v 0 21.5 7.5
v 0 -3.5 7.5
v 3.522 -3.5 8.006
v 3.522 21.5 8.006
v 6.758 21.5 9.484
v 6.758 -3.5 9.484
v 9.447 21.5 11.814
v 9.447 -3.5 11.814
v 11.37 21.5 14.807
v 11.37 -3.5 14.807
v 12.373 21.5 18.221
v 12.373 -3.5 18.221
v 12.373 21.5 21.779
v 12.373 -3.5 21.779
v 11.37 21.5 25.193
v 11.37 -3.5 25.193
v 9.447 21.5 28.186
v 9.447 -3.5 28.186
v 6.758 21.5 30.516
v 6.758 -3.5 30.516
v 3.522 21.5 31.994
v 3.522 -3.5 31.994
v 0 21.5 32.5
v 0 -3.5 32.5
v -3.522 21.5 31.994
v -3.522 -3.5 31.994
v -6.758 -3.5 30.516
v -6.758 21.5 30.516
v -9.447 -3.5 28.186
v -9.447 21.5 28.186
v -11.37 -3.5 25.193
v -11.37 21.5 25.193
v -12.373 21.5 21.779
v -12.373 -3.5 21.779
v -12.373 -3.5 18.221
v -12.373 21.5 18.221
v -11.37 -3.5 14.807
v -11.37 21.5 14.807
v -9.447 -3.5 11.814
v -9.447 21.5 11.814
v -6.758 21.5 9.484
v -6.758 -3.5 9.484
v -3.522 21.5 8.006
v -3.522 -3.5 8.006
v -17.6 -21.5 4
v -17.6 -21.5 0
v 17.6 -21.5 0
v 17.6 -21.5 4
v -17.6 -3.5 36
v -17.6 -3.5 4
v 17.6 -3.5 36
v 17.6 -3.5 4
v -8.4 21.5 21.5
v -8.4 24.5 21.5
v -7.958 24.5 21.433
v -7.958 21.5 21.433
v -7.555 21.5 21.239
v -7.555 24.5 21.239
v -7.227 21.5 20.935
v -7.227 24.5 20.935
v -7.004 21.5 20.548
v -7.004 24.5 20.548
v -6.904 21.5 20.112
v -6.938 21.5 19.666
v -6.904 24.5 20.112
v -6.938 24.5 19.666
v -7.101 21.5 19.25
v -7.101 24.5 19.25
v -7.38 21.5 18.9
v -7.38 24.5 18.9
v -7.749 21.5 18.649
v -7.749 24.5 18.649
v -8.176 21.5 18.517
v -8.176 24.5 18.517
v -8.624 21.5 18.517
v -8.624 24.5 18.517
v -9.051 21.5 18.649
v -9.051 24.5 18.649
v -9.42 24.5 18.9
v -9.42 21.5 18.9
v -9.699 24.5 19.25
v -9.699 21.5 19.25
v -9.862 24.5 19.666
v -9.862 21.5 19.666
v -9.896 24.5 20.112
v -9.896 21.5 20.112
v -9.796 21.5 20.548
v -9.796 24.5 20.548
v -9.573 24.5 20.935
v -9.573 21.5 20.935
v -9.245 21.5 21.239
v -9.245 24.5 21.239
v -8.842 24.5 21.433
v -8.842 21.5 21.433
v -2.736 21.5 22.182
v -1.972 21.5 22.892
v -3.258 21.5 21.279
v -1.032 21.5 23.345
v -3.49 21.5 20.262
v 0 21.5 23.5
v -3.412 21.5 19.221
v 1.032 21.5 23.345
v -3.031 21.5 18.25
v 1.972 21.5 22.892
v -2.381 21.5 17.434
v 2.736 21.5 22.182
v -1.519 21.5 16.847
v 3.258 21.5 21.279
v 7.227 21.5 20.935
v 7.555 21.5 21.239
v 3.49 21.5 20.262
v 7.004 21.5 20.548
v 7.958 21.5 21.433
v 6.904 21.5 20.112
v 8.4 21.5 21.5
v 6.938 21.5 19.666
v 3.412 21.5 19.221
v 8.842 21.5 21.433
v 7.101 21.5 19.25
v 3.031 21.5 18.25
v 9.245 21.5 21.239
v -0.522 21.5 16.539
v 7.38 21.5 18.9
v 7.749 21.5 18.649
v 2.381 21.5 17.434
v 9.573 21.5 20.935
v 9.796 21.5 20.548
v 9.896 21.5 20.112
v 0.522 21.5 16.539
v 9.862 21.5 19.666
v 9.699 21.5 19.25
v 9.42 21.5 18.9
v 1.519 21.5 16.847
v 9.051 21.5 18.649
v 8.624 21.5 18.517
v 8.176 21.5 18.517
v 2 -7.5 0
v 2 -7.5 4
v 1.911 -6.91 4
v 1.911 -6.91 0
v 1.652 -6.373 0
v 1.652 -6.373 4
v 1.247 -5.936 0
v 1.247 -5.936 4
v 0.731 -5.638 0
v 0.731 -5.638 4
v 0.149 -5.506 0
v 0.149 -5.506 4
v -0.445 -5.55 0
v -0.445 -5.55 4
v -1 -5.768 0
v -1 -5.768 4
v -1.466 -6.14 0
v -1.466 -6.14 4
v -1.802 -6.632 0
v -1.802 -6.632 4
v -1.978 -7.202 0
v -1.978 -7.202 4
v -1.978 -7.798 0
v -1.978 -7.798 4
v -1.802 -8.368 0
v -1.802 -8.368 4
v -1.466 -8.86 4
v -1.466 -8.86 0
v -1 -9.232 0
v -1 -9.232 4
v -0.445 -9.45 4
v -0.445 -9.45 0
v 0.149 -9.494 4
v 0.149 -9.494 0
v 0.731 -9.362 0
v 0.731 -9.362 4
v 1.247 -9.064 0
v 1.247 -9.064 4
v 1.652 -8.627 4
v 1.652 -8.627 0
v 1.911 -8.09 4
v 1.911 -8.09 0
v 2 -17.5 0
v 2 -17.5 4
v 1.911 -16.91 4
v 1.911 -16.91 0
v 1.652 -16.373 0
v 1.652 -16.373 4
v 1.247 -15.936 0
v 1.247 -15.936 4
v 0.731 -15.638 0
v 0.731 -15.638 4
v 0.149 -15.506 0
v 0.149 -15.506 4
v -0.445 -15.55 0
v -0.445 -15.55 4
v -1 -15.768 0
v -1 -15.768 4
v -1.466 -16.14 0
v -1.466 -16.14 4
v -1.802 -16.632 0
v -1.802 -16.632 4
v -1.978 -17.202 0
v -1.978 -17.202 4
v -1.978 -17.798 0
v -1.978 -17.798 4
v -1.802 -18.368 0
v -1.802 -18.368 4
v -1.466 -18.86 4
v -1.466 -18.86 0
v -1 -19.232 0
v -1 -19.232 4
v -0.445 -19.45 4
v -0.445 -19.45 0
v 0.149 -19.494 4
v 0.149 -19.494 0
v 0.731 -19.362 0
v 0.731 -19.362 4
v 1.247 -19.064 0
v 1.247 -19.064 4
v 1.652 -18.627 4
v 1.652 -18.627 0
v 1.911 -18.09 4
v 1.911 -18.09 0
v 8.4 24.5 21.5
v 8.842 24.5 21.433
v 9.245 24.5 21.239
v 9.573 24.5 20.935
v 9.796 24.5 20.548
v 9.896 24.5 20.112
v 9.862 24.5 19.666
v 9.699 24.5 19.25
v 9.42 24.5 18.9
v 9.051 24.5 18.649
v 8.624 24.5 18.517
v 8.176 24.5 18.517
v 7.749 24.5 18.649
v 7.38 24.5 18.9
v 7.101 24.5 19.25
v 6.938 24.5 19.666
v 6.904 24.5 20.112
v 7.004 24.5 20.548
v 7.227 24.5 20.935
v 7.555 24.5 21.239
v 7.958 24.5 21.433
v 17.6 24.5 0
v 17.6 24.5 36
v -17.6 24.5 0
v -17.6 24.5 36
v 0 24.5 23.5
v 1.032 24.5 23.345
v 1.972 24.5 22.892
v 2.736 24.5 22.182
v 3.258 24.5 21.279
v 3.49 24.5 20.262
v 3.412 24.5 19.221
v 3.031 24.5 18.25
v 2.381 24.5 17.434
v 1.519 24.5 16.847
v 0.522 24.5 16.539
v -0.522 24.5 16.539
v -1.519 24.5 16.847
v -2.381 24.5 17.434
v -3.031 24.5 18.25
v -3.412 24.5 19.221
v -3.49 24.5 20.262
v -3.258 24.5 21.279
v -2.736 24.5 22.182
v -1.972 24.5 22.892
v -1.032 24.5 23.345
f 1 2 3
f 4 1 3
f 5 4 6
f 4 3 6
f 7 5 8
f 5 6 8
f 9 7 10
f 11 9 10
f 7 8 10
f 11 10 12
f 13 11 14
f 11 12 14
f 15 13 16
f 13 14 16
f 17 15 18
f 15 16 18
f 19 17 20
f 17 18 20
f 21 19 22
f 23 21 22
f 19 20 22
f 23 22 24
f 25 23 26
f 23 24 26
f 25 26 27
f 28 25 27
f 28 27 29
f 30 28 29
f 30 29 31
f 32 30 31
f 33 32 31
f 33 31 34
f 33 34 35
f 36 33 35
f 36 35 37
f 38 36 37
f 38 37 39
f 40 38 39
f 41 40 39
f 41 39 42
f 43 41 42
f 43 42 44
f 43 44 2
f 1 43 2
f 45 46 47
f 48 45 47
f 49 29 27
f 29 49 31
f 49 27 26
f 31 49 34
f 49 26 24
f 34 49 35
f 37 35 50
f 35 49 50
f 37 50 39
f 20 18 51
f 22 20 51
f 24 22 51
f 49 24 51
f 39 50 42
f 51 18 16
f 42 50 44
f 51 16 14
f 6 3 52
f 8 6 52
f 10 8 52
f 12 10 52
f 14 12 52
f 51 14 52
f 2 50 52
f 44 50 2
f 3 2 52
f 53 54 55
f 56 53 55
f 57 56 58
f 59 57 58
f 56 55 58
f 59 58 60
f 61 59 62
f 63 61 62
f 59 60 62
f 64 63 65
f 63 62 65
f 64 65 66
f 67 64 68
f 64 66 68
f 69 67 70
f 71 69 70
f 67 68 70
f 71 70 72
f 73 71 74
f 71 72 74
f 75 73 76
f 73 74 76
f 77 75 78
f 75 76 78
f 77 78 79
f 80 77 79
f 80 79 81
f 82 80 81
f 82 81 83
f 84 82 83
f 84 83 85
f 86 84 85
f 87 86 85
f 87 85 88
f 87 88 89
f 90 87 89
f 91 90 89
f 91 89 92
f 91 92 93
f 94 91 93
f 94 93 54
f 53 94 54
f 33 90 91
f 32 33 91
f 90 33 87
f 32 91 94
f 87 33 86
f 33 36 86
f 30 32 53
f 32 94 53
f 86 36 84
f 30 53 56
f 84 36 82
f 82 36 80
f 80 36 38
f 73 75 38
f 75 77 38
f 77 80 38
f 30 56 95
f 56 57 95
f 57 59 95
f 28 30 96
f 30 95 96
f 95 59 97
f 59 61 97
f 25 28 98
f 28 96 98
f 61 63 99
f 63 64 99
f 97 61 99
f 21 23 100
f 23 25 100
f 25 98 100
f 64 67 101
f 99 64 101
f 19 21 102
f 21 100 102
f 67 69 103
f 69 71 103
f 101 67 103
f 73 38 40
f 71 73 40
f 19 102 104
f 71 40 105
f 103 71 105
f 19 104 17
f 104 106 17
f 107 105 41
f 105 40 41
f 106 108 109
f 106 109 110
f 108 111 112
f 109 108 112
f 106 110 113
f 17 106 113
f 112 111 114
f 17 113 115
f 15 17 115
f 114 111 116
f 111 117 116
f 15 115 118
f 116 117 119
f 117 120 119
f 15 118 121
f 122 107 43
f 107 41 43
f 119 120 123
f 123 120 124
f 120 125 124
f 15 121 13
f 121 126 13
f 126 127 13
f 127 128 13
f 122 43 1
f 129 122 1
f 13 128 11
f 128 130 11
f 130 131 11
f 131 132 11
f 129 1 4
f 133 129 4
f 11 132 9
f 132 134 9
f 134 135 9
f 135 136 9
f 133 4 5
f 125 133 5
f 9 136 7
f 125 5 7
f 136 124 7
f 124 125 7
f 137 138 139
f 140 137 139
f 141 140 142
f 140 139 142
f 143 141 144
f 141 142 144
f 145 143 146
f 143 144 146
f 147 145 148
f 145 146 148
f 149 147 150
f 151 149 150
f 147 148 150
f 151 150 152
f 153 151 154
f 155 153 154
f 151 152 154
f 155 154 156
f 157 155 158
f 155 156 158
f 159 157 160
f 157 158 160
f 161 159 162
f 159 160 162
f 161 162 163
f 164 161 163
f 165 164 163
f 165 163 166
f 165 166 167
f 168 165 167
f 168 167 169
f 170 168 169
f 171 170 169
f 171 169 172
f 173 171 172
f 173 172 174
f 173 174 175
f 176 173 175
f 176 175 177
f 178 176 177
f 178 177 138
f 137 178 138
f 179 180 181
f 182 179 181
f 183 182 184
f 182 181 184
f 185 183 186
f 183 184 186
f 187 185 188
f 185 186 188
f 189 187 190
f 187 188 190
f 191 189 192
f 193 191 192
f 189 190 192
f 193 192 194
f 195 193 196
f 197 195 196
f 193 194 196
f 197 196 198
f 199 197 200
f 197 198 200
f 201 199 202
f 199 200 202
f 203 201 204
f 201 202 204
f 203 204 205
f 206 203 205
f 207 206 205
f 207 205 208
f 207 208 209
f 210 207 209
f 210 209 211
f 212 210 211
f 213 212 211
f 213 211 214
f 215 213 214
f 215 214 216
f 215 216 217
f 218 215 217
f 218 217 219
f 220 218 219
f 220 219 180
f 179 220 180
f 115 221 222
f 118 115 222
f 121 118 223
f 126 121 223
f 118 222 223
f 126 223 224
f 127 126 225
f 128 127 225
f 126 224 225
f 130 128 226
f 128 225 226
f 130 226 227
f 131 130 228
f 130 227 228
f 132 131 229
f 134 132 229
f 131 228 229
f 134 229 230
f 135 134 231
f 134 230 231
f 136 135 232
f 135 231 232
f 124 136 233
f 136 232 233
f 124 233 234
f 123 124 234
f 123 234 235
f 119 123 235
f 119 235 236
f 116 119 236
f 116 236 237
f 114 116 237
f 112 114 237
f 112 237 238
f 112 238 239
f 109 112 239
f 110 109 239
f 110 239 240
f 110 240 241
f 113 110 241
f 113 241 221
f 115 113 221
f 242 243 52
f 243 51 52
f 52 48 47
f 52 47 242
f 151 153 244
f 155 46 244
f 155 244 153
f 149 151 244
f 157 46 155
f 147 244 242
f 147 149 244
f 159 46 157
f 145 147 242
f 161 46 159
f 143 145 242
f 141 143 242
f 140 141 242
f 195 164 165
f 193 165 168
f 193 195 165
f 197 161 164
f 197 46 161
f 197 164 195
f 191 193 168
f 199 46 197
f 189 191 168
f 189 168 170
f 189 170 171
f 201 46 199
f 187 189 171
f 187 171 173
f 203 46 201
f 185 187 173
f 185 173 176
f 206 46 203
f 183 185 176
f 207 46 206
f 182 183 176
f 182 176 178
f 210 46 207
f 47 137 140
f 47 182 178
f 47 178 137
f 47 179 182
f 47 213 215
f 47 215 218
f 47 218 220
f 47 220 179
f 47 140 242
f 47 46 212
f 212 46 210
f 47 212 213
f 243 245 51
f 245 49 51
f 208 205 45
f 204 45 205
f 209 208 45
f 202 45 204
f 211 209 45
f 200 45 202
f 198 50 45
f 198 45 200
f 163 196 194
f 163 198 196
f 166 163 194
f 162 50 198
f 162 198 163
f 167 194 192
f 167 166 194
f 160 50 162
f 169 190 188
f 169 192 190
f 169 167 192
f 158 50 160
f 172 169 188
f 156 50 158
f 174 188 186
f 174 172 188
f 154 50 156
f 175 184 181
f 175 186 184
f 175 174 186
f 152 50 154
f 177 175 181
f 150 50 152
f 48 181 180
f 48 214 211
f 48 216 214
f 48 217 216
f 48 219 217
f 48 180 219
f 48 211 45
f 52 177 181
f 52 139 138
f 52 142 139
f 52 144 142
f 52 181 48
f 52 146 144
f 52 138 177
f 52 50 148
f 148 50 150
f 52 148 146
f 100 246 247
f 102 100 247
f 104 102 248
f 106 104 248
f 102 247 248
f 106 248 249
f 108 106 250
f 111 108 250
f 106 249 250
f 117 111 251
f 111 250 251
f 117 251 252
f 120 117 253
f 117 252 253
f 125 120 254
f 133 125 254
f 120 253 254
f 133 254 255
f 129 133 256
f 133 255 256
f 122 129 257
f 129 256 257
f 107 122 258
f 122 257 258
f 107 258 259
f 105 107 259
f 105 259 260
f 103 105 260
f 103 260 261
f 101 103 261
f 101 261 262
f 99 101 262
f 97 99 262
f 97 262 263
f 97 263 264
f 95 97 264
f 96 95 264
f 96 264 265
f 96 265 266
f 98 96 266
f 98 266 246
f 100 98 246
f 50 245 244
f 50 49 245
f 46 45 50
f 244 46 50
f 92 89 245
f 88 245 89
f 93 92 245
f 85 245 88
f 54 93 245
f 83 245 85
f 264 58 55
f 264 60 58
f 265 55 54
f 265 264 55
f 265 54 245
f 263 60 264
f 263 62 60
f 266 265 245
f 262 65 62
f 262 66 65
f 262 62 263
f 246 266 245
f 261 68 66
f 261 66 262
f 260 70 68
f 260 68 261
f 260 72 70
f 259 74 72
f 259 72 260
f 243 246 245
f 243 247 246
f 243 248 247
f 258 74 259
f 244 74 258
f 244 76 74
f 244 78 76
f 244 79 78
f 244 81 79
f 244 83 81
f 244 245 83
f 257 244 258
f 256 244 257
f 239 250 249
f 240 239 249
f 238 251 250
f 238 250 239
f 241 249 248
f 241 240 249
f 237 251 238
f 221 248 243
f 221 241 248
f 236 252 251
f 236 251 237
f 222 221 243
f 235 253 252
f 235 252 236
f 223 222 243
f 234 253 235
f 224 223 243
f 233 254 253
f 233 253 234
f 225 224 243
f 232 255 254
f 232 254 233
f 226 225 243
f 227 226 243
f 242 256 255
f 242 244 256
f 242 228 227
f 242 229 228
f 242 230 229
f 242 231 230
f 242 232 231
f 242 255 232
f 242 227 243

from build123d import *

# Parameters (mm, degrees)
SKETCH_1_W          = 35.2
SKETCH_1_H          = 43
EXTRUDE_1_DEPTH     = 4
SKETCH_2_W          = 35.2
SKETCH_2_H          = 25
EXTRUDE_2_DEPTH     = 32
SKETCH_4_R          = 12.5
CUT_EXTRUDE_1_DEPTH = 32
SKETCH_6_R          = 2
CUT_EXTRUDE_2_DEPTH = 32
SKETCH_7_W          = 35.2
SKETCH_7_H          = 36
EXTRUDE_3_DEPTH     = 3
SKETCH_8_R          = 3.5
SKETCH_8_R_2        = 1.5
CUT_EXTRUDE_3_DEPTH = 10


with BuildPart() as part:
    # Эскиз1 → Бобышка-Вытянуть1 (new body)
    with BuildSketch(Plane.XY):
        Rectangle(SKETCH_1_W, SKETCH_1_H)
    extrude(amount=EXTRUDE_1_DEPTH)

    # Эскиз2 → Бобышка-Вытянуть2 (add)
    with BuildSketch(Plane.XY.offset(4)):
        with Locations((0, 9)):
            Rectangle(SKETCH_2_W, SKETCH_2_H)
    extrude(amount=EXTRUDE_2_DEPTH)

    # Эскиз4 → Вырез-Вытянуть1 (cut)
    with BuildSketch(Plane.XZ.offset(3.5)):
        with Locations(Location((0, 20, 0), (0, 0, 270))):
            Circle(SKETCH_4_R)
    extrude(amount=-CUT_EXTRUDE_1_DEPTH, mode=Mode.SUBTRACT)

    # Эскиз6 → Вырез-Вытянуть2 (cut)
    with BuildSketch(Plane.XY.offset(4)):
        with Locations((0, -7.5)):
            Circle(SKETCH_6_R)
        with Locations((0, -17.5)):
            Circle(SKETCH_6_R)
    extrude(amount=-CUT_EXTRUDE_2_DEPTH, mode=Mode.SUBTRACT)

    # Эскиз7 → Бобышка-Вытянуть3 (add)
    with BuildSketch(Plane(origin=(0, 21.5, 0), x_dir=(1, 0, 0), z_dir=(0, 1, 0))):
        with Locations((0, -18)):
            Rectangle(SKETCH_7_W, SKETCH_7_H)
    extrude(amount=EXTRUDE_3_DEPTH)

    # Эскиз8 → Вырез-Вытянуть3 (cut)
    with BuildSketch(Plane(origin=(0, 24.5, 0), x_dir=(1, 0, 0), z_dir=(0, 1, 0))):
        with Locations(Location((0, -20, 0), (0, 0, 270))):
            Circle(SKETCH_8_R)
        with Locations(Location((8.4, -20, 0), (0, 0, 270))):
            Circle(SKETCH_8_R_2)
        with Locations(Location((-8.4, -20, 0), (0, 0, 270))):
            Circle(SKETCH_8_R_2)
    extrude(amount=-CUT_EXTRUDE_3_DEPTH, mode=Mode.SUBTRACT)


solid = part.part
